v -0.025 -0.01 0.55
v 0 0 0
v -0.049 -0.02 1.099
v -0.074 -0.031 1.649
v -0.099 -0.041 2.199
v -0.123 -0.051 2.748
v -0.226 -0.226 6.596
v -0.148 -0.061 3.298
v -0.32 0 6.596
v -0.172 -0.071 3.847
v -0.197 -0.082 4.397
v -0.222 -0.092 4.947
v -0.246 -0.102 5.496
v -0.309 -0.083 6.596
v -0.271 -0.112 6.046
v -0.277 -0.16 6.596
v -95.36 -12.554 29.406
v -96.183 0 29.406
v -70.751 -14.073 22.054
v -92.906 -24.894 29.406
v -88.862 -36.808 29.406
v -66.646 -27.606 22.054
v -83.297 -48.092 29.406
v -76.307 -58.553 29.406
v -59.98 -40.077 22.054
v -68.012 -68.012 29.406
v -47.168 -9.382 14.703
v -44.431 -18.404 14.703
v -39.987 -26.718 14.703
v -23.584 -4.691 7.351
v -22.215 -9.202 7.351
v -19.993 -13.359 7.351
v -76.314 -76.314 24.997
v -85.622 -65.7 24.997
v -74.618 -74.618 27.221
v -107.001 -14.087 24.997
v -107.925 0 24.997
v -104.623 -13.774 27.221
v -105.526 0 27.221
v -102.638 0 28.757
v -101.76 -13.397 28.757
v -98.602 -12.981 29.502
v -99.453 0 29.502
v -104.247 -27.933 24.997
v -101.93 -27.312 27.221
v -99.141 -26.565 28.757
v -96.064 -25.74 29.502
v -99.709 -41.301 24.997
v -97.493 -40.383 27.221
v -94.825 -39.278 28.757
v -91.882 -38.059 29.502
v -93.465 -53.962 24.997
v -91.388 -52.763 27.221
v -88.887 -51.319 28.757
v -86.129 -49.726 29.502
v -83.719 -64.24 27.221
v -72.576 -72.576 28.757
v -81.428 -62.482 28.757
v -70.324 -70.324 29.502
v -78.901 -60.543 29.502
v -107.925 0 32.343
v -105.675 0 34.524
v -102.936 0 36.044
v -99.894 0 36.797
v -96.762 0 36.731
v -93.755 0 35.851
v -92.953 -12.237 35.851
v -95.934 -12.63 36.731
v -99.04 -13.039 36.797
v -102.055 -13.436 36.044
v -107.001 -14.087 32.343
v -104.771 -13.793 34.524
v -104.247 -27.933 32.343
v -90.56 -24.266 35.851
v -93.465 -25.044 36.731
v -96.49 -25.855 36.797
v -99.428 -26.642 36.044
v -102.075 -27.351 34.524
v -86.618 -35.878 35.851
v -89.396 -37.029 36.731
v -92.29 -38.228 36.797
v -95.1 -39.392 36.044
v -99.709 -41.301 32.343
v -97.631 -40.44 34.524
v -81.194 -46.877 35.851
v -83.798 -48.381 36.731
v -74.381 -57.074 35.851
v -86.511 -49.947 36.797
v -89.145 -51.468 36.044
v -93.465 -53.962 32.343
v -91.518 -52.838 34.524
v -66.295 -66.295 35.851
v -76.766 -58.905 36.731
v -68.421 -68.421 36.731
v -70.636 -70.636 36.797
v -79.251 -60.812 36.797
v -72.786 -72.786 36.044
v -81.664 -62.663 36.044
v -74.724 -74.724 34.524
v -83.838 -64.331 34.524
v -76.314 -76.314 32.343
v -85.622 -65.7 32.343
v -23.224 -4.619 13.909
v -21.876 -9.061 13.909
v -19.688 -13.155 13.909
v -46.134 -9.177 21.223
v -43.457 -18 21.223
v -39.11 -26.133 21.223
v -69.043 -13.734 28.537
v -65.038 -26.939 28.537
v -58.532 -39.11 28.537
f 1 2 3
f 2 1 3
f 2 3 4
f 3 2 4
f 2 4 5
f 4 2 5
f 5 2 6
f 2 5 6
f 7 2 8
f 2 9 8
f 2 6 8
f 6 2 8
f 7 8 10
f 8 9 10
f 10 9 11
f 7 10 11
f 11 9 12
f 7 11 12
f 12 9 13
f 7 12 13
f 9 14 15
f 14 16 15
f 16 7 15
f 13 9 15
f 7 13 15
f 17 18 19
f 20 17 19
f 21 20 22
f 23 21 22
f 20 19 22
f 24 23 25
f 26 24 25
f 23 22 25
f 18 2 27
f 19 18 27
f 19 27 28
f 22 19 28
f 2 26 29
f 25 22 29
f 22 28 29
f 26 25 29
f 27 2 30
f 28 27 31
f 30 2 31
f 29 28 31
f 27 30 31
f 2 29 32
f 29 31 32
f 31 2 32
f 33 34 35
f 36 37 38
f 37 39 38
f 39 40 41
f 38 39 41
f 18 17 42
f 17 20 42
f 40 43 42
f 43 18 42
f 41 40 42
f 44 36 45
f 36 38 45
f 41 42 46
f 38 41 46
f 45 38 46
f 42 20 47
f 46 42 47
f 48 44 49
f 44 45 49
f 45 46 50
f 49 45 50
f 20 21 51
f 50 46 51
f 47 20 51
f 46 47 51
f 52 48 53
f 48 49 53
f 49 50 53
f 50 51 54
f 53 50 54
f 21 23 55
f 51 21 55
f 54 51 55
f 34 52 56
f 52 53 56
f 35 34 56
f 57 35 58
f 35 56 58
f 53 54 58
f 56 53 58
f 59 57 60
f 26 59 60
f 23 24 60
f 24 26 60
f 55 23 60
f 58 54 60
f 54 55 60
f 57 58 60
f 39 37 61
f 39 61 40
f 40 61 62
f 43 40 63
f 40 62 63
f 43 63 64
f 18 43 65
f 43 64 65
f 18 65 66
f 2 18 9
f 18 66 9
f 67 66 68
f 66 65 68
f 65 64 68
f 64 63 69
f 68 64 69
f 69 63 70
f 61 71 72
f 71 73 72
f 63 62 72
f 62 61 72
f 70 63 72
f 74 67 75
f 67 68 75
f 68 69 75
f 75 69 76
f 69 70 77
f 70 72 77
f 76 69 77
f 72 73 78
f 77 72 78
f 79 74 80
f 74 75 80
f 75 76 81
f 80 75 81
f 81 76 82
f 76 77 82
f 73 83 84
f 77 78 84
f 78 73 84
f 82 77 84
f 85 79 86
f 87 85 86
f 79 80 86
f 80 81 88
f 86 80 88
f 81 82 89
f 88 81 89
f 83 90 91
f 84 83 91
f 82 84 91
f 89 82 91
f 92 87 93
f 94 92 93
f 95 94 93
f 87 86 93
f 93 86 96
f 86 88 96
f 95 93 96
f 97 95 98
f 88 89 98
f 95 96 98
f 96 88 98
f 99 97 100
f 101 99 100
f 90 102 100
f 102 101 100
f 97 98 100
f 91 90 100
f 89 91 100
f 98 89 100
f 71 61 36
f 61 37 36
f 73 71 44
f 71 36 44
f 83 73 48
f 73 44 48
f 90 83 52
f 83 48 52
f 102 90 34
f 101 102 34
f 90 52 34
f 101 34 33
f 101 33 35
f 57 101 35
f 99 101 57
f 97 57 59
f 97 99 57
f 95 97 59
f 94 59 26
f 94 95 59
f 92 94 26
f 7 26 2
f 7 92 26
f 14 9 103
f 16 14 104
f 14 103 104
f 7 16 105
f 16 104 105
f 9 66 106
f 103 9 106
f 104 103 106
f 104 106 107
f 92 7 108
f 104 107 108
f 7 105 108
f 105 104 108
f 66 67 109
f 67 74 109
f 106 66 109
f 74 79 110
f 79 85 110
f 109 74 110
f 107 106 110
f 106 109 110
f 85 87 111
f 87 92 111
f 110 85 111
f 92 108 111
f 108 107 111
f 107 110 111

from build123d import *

# Parameters (mm, degrees)
F1_ANGLE = 45


# Not quite as in the source:
# - a feature names something its author has since deleted; it is built from what else it names


with BuildPart() as f1:
    # F0 (on Front) → F1 (revolve)
    with BuildSketch(Plane.XZ):
        with BuildLine():
            Line((0, 0), (-0.3200573587, 6.5955988818))
            Line((-0.3200573587, 6.5955988818), (-93.7548232766, 35.8510324721))
            ThreePointArc((-93.7548232766, 35.8510324721), (-101.4397958576, 36.5208008084), (-107.92452842, 32.3428064585))
            Line((-107.92452842, 32.3428064585), (-107.92452842, 24.9973144382))
            ThreePointArc((-107.92452842, 24.9973144382), (-102.6379346155, 28.7570956855), (-96.1832379704, 29.4058793942))
            Line((-96.1832379704, 29.4058793942), (0, 0))
        make_face()
    revolve(axis=Axis((0, 0, 59.7953810357), (0, 0, 1)), revolution_arc=F1_ANGLE)


solid = f1.part
